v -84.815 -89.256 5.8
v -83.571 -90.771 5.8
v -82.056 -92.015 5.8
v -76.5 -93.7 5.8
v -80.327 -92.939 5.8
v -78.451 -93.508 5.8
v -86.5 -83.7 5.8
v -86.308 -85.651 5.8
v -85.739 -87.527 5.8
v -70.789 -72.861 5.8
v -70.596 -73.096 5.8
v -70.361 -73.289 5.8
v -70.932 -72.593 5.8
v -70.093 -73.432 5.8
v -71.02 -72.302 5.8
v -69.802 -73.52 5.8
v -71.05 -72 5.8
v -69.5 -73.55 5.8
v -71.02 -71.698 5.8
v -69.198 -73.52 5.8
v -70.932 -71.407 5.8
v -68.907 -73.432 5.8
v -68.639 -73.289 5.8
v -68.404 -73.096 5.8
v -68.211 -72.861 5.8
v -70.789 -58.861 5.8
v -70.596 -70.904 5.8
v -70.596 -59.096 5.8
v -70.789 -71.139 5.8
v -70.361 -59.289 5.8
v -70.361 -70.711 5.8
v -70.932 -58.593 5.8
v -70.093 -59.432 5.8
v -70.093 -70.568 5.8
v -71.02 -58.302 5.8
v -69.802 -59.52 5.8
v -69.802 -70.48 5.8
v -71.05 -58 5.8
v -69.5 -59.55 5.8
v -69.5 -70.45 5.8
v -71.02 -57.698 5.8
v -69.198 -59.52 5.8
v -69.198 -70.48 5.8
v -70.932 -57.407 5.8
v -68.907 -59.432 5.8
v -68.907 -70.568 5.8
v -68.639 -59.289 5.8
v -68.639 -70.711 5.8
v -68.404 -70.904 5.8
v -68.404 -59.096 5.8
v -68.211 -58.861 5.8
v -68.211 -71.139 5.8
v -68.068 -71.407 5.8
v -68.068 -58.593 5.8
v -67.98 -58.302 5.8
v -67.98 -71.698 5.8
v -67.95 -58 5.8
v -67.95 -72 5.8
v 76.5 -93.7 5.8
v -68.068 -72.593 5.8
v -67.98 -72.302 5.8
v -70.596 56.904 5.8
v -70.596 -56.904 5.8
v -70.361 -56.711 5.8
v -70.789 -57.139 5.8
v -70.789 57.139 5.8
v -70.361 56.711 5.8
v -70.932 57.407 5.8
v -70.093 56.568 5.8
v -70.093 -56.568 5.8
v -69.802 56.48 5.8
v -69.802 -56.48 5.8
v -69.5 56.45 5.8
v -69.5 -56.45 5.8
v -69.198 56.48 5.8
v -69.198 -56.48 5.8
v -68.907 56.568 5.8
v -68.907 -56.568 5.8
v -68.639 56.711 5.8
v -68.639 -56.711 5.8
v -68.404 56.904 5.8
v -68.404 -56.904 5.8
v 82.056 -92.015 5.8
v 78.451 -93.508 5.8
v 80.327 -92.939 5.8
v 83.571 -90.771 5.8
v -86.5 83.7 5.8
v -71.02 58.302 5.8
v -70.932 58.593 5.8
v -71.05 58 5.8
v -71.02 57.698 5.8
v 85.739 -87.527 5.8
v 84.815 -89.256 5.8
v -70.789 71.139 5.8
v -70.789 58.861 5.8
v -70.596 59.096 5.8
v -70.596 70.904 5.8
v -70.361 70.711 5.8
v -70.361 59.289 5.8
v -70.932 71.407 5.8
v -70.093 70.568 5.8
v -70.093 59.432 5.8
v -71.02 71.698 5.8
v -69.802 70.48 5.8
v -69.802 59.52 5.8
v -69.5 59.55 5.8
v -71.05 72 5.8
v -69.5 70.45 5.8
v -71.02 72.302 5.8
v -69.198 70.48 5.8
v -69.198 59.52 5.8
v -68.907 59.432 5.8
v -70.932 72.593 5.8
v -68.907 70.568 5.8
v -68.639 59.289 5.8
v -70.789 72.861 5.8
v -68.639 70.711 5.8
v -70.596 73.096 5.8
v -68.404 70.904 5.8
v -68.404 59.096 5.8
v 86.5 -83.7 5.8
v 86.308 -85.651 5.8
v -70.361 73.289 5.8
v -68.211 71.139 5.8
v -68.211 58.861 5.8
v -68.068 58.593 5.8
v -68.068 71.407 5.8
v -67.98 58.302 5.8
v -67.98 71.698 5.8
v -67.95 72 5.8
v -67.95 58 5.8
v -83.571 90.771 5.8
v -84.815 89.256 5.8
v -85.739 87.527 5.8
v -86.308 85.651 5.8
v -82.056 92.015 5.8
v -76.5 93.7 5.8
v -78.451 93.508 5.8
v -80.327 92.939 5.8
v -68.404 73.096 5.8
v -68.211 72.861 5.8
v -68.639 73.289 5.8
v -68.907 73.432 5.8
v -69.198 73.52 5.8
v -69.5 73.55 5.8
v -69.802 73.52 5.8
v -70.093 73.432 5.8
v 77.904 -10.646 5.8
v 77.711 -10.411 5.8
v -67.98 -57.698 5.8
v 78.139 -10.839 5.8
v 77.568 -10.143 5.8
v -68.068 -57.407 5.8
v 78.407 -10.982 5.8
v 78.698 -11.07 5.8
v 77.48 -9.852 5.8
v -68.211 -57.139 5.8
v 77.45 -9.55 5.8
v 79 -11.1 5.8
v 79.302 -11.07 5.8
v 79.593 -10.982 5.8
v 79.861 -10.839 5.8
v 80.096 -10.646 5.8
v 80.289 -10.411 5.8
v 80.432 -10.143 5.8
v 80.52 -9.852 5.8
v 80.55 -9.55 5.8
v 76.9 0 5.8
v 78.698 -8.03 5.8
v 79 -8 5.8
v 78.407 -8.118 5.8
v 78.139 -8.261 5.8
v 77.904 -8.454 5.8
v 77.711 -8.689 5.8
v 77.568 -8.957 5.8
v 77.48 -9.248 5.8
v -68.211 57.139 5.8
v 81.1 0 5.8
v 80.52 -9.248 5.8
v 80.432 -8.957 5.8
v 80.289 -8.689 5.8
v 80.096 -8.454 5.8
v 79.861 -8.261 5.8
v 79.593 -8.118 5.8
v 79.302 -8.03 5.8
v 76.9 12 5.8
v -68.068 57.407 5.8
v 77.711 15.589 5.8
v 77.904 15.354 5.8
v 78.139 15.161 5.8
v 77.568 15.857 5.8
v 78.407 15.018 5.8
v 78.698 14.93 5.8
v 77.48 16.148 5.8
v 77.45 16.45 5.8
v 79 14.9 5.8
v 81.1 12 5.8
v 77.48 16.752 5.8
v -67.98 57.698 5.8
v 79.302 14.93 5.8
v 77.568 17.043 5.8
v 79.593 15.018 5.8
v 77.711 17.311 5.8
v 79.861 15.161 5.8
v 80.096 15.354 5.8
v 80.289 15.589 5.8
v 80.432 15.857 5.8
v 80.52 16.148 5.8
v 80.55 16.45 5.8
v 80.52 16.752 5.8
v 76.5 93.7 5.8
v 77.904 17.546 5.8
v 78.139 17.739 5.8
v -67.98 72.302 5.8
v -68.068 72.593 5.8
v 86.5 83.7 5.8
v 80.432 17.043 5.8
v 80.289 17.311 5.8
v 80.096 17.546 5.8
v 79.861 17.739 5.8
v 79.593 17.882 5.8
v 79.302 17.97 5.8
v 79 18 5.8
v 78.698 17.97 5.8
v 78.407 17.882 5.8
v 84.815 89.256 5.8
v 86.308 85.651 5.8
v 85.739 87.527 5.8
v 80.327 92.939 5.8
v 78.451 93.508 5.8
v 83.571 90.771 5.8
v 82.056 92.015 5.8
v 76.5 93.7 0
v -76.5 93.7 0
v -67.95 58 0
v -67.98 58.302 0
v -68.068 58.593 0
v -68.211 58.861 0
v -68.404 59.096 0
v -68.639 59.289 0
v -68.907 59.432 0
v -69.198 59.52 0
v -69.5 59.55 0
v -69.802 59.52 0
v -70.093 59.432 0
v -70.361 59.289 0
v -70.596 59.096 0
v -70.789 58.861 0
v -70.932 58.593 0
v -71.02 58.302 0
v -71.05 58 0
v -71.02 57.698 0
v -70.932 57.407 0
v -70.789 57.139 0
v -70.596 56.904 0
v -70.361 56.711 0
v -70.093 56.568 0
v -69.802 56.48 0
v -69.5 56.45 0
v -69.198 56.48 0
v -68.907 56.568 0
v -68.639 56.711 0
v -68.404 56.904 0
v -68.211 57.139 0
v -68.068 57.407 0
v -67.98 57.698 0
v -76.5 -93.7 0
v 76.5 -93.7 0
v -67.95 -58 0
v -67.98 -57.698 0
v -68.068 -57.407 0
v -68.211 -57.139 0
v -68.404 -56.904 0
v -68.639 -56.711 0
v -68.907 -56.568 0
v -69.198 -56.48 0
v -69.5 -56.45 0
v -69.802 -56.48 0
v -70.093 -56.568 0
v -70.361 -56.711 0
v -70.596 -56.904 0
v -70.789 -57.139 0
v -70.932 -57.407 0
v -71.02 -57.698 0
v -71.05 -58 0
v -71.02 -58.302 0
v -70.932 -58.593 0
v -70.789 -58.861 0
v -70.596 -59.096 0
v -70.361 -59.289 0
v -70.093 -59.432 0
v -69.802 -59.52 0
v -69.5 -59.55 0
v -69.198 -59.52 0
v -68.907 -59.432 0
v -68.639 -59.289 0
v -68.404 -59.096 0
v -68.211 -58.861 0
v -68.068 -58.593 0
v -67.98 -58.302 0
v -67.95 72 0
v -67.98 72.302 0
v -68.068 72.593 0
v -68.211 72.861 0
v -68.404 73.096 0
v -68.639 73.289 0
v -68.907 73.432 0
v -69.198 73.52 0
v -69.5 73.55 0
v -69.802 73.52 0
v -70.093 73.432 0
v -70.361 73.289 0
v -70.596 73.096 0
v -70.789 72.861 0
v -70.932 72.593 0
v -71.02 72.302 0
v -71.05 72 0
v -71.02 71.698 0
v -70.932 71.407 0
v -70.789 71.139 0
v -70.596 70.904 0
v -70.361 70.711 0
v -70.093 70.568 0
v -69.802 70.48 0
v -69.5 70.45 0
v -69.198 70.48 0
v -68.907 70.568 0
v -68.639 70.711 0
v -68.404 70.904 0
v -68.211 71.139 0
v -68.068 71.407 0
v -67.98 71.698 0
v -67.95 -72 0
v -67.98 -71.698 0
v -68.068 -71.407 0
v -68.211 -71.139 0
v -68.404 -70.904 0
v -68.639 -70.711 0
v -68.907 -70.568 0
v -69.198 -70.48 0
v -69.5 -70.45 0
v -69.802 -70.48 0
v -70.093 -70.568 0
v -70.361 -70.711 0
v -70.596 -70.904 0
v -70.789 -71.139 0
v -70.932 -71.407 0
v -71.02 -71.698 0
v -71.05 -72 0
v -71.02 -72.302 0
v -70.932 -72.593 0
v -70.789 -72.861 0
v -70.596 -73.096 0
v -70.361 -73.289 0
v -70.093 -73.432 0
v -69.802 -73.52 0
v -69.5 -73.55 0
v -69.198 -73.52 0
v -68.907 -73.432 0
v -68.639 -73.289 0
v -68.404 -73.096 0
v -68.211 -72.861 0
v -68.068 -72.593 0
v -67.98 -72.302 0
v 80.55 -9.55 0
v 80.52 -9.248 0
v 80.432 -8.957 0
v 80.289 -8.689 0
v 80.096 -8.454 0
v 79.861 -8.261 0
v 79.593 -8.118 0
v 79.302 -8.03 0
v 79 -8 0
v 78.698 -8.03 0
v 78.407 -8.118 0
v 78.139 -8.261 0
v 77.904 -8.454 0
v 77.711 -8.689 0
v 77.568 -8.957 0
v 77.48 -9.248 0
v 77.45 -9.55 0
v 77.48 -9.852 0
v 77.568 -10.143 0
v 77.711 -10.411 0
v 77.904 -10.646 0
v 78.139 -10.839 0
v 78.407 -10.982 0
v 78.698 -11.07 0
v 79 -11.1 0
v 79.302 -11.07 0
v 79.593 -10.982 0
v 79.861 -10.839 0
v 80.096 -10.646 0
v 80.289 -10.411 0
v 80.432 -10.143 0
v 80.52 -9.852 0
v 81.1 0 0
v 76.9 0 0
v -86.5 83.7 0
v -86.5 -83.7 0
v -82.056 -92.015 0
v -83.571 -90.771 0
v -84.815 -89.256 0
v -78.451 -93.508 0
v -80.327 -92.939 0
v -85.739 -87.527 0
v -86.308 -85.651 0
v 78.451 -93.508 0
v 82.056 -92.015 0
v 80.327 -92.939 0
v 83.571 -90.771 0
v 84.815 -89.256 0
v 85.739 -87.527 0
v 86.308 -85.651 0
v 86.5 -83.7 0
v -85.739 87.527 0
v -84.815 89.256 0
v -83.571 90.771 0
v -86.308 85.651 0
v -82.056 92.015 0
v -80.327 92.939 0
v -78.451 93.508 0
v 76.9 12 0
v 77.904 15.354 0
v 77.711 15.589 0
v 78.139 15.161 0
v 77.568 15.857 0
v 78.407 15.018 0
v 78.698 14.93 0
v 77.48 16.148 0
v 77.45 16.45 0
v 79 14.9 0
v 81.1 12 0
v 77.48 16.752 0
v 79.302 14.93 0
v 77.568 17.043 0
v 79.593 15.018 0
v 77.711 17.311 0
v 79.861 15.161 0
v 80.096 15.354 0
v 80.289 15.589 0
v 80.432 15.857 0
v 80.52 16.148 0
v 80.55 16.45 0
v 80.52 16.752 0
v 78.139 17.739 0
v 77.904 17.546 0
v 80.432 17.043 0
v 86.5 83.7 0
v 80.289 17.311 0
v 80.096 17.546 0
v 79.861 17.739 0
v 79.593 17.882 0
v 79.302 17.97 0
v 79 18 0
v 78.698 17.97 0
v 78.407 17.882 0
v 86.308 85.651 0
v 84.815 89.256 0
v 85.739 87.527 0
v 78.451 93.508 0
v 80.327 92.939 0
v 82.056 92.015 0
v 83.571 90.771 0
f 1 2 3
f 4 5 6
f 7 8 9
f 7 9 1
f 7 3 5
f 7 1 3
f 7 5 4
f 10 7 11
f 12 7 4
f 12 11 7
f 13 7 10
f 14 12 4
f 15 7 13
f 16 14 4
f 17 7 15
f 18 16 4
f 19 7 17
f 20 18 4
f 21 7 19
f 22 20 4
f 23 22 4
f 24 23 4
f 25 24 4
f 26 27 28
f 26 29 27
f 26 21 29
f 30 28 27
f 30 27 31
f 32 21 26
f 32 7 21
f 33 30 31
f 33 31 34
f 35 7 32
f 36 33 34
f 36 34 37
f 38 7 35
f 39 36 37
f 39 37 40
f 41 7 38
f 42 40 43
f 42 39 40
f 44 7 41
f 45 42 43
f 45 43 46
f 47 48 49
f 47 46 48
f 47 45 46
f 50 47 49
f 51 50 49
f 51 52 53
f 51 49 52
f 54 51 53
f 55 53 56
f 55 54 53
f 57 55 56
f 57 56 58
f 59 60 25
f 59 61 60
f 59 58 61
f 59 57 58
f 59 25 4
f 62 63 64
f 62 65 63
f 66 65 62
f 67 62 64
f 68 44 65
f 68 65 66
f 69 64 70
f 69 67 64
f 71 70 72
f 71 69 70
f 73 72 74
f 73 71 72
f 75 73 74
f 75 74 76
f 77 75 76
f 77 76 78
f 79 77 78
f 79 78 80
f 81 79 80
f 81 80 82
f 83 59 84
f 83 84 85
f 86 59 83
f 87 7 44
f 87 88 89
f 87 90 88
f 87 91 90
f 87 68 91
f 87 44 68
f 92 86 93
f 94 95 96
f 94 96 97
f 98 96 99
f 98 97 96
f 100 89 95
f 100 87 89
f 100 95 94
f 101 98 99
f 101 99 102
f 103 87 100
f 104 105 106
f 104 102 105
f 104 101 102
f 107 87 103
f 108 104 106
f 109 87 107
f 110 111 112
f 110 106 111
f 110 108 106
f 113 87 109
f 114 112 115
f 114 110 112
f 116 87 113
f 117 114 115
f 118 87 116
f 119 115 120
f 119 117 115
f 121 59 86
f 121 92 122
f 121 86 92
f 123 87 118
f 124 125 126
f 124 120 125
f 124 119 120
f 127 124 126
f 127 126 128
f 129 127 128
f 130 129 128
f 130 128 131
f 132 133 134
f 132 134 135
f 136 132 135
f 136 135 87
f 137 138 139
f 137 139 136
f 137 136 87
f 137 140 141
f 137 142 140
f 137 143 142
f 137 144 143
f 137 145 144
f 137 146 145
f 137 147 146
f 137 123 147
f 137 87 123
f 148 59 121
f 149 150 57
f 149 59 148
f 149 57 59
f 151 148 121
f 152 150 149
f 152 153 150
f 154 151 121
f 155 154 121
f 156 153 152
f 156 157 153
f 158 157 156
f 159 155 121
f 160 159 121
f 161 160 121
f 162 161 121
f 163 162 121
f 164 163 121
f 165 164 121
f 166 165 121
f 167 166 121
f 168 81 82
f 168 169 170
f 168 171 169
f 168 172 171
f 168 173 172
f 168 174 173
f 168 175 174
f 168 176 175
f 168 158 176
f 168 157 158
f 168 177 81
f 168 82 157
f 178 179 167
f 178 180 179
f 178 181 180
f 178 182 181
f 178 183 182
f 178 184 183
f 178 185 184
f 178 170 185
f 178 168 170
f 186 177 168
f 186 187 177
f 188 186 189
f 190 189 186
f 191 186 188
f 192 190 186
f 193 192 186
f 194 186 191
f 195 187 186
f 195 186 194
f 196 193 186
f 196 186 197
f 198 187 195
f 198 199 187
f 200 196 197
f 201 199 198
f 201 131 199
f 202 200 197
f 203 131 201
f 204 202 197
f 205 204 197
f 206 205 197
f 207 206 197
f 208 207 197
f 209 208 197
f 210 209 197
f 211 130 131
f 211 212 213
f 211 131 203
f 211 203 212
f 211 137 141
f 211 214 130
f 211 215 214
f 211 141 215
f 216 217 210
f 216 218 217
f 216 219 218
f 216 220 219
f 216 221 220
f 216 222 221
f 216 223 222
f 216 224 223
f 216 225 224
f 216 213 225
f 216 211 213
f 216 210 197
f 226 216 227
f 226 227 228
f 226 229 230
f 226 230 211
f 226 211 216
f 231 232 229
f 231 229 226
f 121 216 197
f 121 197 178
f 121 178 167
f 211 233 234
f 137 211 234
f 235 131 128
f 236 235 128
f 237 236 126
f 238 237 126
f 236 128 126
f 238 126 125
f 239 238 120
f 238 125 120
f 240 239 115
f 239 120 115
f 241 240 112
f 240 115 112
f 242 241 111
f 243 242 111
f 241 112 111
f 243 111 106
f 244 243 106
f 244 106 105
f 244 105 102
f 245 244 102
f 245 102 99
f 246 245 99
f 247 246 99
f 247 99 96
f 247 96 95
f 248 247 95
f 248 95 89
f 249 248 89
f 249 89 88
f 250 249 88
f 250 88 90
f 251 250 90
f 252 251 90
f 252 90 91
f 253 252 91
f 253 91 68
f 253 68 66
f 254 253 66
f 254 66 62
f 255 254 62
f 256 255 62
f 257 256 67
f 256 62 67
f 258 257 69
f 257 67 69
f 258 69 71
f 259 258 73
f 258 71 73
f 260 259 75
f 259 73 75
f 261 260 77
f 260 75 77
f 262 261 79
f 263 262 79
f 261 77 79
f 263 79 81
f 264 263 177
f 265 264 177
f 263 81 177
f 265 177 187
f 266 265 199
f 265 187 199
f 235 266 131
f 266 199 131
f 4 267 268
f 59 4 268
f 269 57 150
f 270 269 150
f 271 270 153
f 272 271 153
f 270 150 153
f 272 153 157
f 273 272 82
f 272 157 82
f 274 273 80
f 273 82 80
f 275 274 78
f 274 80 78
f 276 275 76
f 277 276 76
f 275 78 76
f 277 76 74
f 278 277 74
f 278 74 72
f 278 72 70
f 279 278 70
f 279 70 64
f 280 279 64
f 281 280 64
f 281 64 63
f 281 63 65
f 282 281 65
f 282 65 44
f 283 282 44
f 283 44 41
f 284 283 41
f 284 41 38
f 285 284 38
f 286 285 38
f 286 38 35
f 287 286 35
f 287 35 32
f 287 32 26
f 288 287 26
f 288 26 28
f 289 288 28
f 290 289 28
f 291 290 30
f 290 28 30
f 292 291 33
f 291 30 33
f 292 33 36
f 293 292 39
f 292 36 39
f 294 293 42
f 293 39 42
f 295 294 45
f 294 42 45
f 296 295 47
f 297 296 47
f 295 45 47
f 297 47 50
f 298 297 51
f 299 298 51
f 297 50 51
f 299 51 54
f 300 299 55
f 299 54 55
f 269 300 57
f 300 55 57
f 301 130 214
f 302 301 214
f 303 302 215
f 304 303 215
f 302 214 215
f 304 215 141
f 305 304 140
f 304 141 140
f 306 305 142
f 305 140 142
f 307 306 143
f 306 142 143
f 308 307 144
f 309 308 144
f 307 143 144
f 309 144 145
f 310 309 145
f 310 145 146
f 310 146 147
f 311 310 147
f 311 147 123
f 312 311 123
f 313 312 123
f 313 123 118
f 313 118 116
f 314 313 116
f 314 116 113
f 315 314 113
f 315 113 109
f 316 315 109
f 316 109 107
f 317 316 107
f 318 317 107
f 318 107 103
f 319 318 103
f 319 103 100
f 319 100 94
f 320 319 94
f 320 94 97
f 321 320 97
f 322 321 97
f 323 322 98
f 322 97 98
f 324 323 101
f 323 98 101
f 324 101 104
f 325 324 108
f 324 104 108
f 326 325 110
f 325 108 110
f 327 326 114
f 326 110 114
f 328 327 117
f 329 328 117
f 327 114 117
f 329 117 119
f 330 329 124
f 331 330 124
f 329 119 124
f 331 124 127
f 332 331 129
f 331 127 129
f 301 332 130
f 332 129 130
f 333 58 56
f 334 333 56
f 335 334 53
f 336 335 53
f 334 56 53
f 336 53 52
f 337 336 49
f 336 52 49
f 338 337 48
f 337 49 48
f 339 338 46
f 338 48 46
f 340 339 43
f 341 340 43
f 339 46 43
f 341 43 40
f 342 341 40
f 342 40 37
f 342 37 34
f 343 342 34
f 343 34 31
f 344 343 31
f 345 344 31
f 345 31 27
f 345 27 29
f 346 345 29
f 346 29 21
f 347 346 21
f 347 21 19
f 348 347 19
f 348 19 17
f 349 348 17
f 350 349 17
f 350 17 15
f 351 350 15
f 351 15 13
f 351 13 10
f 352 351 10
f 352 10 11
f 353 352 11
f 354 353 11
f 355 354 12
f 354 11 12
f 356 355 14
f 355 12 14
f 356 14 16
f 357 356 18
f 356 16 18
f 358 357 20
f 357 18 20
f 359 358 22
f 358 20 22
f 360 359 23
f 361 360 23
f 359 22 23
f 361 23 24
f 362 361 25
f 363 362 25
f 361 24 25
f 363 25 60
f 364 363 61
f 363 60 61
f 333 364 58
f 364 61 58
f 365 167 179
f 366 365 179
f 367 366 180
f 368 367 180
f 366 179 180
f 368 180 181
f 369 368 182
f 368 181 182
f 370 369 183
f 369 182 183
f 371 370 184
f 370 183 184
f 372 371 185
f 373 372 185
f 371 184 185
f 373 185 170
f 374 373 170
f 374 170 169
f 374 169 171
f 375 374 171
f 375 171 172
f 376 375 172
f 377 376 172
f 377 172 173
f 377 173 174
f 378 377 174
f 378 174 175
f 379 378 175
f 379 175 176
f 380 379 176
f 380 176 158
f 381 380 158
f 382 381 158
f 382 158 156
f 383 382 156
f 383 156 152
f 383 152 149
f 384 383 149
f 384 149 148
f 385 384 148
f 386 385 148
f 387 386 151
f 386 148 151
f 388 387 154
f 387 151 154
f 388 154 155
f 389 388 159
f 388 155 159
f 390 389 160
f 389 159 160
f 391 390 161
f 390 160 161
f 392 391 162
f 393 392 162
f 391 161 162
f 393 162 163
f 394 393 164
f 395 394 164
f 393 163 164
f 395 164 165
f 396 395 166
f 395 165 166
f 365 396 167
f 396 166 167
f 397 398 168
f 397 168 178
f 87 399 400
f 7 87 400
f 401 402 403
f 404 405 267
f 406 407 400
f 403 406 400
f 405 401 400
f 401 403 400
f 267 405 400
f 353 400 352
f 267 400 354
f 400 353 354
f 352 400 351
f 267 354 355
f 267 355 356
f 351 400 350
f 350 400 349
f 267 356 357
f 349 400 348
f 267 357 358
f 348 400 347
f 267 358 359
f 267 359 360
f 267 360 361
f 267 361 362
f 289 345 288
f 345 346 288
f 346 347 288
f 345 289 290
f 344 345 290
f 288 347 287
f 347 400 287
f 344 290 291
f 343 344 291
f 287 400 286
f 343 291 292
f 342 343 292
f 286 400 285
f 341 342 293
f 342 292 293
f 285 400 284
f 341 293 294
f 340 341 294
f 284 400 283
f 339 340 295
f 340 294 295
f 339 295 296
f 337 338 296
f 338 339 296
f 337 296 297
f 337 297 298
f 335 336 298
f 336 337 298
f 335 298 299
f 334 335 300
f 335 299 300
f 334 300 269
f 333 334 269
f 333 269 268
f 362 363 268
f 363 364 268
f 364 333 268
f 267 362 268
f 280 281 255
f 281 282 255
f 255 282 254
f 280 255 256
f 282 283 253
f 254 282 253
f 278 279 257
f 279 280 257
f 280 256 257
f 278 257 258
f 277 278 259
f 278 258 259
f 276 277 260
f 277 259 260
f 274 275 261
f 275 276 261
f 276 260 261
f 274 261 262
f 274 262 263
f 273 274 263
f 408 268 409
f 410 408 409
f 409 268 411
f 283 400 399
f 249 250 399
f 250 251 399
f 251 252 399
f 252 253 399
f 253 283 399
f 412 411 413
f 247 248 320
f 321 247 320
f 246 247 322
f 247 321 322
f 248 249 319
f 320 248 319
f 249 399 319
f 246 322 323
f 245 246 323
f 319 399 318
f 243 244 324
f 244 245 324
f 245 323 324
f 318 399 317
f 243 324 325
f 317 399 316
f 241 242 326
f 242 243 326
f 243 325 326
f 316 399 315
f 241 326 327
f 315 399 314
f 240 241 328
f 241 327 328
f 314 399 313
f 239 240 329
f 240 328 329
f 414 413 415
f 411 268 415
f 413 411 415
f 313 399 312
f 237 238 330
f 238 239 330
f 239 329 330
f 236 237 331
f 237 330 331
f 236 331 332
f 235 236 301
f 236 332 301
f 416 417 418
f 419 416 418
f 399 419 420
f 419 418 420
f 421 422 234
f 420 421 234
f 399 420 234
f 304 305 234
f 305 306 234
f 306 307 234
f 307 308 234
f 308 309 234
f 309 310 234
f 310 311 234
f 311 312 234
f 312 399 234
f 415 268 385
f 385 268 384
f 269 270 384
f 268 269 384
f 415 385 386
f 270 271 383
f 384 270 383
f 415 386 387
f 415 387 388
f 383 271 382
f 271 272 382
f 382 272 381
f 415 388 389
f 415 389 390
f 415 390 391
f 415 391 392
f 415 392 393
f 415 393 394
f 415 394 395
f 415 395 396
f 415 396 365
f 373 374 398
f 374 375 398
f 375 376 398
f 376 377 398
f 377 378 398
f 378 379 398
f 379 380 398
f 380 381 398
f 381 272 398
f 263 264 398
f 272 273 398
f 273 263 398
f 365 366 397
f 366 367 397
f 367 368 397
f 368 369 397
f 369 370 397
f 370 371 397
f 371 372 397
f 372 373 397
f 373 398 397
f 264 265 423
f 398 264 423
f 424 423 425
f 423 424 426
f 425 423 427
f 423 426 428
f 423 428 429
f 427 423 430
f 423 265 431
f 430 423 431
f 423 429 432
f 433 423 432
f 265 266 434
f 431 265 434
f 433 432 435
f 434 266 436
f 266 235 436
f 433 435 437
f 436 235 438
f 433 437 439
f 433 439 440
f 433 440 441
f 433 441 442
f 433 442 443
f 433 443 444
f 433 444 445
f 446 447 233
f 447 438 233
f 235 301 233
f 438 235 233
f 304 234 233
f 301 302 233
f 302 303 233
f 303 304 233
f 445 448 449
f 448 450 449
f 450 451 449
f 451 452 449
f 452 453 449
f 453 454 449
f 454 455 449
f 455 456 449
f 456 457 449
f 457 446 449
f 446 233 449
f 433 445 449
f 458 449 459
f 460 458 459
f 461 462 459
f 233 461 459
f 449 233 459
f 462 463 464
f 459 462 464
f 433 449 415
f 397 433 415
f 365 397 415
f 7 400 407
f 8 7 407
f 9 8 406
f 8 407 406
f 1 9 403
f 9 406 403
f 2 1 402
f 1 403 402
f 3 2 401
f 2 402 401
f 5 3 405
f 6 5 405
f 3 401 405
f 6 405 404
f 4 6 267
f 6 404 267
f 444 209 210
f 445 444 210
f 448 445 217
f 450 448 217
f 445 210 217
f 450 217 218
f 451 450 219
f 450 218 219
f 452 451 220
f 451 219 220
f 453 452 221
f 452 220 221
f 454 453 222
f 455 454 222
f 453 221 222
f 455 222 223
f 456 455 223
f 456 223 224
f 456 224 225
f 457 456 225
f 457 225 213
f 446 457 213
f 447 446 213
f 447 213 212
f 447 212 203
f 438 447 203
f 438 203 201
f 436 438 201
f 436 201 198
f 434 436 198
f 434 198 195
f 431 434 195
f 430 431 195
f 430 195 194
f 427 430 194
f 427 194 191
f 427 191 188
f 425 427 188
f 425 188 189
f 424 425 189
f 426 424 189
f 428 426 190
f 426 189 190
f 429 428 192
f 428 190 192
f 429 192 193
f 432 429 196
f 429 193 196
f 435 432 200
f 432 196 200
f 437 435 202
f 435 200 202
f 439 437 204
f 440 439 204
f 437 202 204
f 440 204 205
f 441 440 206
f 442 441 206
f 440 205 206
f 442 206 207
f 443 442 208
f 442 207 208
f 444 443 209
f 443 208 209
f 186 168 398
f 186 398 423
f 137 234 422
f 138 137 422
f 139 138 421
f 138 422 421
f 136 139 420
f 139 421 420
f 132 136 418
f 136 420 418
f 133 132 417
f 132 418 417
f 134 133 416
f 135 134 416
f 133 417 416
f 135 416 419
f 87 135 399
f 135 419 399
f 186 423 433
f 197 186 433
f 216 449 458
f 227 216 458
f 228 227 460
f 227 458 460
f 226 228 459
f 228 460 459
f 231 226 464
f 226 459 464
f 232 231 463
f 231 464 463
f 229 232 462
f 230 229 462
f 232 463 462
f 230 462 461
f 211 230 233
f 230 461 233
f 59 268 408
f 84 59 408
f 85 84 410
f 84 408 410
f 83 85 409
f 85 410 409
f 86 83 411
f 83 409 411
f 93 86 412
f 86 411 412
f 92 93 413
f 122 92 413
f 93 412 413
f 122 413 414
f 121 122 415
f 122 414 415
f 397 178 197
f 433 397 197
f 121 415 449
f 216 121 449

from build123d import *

# Parameters (mm, degrees)
BOSS_EXTRUDE1_DEPTH = 5.8
SKETCH3_W           = 4.2
SKETCH3_H           = 12
CUT_EXTRUDE1_DEPTH  = 6.35
SKETCH4_R           = 1.55
CUT_EXTRUDE2_DEPTH  = 6.8
SKETCH5_R           = 1.55
CUT_EXTRUDE3_DEPTH  = 6.8


with BuildPart() as part:
    # Sketch2 → Boss-Extrude1 (new body)
    with BuildSketch(Plane.XY):
        with BuildLine():
            Line((76.5, 93.7), (-76.5, 93.7))
            ThreePointArc((-76.5, 93.7), (-83.571067812, 90.771067812), (-86.5, 83.7))
            Line((-86.5, 83.7), (-86.5, -83.7))
            ThreePointArc((-86.5, -83.7), (-83.571067812, -90.771067812), (-76.5, -93.7))
            Line((-76.5, -93.7), (76.5, -93.7))
            ThreePointArc((76.5, -93.7), (83.571067812, -90.771067812), (86.5, -83.7))
            Line((86.5, -83.7), (86.5, 83.7))
            ThreePointArc((86.5, 83.7), (83.571067812, 90.771067812), (76.5, 93.7))
        make_face()
    extrude(amount=BOSS_EXTRUDE1_DEPTH)

    # Sketch3 → Cut-Extrude1 (cut)
    with BuildSketch(Plane.XY.offset(5.8)):
        with Locations((79, 6)):
            Rectangle(SKETCH3_W, SKETCH3_H)
    extrude(amount=-CUT_EXTRUDE1_DEPTH, mode=Mode.SUBTRACT)

    # Sketch4 → Cut-Extrude2 (cut, through all)
    with BuildSketch(Plane.XY.offset(5.8)):
        with Locations((-69.5, 72)):
            Circle(SKETCH4_R)
        with Locations((-69.5, 58)):
            Circle(SKETCH4_R)
        with Locations((-69.5, -58)):
            Circle(SKETCH4_R)
        with Locations((-69.5, -72)):
            Circle(SKETCH4_R)
    extrude(amount=-CUT_EXTRUDE2_DEPTH, mode=Mode.SUBTRACT)

    # Sketch5 → Cut-Extrude3 (cut, through all)
    with BuildSketch(Plane.XY.offset(5.8)):
        with Locations((79, 16.45)):
            Circle(SKETCH5_R)
        with Locations((79, -9.55)):
            Circle(SKETCH5_R)
    extrude(amount=-CUT_EXTRUDE3_DEPTH, mode=Mode.SUBTRACT)


solid = part.part
